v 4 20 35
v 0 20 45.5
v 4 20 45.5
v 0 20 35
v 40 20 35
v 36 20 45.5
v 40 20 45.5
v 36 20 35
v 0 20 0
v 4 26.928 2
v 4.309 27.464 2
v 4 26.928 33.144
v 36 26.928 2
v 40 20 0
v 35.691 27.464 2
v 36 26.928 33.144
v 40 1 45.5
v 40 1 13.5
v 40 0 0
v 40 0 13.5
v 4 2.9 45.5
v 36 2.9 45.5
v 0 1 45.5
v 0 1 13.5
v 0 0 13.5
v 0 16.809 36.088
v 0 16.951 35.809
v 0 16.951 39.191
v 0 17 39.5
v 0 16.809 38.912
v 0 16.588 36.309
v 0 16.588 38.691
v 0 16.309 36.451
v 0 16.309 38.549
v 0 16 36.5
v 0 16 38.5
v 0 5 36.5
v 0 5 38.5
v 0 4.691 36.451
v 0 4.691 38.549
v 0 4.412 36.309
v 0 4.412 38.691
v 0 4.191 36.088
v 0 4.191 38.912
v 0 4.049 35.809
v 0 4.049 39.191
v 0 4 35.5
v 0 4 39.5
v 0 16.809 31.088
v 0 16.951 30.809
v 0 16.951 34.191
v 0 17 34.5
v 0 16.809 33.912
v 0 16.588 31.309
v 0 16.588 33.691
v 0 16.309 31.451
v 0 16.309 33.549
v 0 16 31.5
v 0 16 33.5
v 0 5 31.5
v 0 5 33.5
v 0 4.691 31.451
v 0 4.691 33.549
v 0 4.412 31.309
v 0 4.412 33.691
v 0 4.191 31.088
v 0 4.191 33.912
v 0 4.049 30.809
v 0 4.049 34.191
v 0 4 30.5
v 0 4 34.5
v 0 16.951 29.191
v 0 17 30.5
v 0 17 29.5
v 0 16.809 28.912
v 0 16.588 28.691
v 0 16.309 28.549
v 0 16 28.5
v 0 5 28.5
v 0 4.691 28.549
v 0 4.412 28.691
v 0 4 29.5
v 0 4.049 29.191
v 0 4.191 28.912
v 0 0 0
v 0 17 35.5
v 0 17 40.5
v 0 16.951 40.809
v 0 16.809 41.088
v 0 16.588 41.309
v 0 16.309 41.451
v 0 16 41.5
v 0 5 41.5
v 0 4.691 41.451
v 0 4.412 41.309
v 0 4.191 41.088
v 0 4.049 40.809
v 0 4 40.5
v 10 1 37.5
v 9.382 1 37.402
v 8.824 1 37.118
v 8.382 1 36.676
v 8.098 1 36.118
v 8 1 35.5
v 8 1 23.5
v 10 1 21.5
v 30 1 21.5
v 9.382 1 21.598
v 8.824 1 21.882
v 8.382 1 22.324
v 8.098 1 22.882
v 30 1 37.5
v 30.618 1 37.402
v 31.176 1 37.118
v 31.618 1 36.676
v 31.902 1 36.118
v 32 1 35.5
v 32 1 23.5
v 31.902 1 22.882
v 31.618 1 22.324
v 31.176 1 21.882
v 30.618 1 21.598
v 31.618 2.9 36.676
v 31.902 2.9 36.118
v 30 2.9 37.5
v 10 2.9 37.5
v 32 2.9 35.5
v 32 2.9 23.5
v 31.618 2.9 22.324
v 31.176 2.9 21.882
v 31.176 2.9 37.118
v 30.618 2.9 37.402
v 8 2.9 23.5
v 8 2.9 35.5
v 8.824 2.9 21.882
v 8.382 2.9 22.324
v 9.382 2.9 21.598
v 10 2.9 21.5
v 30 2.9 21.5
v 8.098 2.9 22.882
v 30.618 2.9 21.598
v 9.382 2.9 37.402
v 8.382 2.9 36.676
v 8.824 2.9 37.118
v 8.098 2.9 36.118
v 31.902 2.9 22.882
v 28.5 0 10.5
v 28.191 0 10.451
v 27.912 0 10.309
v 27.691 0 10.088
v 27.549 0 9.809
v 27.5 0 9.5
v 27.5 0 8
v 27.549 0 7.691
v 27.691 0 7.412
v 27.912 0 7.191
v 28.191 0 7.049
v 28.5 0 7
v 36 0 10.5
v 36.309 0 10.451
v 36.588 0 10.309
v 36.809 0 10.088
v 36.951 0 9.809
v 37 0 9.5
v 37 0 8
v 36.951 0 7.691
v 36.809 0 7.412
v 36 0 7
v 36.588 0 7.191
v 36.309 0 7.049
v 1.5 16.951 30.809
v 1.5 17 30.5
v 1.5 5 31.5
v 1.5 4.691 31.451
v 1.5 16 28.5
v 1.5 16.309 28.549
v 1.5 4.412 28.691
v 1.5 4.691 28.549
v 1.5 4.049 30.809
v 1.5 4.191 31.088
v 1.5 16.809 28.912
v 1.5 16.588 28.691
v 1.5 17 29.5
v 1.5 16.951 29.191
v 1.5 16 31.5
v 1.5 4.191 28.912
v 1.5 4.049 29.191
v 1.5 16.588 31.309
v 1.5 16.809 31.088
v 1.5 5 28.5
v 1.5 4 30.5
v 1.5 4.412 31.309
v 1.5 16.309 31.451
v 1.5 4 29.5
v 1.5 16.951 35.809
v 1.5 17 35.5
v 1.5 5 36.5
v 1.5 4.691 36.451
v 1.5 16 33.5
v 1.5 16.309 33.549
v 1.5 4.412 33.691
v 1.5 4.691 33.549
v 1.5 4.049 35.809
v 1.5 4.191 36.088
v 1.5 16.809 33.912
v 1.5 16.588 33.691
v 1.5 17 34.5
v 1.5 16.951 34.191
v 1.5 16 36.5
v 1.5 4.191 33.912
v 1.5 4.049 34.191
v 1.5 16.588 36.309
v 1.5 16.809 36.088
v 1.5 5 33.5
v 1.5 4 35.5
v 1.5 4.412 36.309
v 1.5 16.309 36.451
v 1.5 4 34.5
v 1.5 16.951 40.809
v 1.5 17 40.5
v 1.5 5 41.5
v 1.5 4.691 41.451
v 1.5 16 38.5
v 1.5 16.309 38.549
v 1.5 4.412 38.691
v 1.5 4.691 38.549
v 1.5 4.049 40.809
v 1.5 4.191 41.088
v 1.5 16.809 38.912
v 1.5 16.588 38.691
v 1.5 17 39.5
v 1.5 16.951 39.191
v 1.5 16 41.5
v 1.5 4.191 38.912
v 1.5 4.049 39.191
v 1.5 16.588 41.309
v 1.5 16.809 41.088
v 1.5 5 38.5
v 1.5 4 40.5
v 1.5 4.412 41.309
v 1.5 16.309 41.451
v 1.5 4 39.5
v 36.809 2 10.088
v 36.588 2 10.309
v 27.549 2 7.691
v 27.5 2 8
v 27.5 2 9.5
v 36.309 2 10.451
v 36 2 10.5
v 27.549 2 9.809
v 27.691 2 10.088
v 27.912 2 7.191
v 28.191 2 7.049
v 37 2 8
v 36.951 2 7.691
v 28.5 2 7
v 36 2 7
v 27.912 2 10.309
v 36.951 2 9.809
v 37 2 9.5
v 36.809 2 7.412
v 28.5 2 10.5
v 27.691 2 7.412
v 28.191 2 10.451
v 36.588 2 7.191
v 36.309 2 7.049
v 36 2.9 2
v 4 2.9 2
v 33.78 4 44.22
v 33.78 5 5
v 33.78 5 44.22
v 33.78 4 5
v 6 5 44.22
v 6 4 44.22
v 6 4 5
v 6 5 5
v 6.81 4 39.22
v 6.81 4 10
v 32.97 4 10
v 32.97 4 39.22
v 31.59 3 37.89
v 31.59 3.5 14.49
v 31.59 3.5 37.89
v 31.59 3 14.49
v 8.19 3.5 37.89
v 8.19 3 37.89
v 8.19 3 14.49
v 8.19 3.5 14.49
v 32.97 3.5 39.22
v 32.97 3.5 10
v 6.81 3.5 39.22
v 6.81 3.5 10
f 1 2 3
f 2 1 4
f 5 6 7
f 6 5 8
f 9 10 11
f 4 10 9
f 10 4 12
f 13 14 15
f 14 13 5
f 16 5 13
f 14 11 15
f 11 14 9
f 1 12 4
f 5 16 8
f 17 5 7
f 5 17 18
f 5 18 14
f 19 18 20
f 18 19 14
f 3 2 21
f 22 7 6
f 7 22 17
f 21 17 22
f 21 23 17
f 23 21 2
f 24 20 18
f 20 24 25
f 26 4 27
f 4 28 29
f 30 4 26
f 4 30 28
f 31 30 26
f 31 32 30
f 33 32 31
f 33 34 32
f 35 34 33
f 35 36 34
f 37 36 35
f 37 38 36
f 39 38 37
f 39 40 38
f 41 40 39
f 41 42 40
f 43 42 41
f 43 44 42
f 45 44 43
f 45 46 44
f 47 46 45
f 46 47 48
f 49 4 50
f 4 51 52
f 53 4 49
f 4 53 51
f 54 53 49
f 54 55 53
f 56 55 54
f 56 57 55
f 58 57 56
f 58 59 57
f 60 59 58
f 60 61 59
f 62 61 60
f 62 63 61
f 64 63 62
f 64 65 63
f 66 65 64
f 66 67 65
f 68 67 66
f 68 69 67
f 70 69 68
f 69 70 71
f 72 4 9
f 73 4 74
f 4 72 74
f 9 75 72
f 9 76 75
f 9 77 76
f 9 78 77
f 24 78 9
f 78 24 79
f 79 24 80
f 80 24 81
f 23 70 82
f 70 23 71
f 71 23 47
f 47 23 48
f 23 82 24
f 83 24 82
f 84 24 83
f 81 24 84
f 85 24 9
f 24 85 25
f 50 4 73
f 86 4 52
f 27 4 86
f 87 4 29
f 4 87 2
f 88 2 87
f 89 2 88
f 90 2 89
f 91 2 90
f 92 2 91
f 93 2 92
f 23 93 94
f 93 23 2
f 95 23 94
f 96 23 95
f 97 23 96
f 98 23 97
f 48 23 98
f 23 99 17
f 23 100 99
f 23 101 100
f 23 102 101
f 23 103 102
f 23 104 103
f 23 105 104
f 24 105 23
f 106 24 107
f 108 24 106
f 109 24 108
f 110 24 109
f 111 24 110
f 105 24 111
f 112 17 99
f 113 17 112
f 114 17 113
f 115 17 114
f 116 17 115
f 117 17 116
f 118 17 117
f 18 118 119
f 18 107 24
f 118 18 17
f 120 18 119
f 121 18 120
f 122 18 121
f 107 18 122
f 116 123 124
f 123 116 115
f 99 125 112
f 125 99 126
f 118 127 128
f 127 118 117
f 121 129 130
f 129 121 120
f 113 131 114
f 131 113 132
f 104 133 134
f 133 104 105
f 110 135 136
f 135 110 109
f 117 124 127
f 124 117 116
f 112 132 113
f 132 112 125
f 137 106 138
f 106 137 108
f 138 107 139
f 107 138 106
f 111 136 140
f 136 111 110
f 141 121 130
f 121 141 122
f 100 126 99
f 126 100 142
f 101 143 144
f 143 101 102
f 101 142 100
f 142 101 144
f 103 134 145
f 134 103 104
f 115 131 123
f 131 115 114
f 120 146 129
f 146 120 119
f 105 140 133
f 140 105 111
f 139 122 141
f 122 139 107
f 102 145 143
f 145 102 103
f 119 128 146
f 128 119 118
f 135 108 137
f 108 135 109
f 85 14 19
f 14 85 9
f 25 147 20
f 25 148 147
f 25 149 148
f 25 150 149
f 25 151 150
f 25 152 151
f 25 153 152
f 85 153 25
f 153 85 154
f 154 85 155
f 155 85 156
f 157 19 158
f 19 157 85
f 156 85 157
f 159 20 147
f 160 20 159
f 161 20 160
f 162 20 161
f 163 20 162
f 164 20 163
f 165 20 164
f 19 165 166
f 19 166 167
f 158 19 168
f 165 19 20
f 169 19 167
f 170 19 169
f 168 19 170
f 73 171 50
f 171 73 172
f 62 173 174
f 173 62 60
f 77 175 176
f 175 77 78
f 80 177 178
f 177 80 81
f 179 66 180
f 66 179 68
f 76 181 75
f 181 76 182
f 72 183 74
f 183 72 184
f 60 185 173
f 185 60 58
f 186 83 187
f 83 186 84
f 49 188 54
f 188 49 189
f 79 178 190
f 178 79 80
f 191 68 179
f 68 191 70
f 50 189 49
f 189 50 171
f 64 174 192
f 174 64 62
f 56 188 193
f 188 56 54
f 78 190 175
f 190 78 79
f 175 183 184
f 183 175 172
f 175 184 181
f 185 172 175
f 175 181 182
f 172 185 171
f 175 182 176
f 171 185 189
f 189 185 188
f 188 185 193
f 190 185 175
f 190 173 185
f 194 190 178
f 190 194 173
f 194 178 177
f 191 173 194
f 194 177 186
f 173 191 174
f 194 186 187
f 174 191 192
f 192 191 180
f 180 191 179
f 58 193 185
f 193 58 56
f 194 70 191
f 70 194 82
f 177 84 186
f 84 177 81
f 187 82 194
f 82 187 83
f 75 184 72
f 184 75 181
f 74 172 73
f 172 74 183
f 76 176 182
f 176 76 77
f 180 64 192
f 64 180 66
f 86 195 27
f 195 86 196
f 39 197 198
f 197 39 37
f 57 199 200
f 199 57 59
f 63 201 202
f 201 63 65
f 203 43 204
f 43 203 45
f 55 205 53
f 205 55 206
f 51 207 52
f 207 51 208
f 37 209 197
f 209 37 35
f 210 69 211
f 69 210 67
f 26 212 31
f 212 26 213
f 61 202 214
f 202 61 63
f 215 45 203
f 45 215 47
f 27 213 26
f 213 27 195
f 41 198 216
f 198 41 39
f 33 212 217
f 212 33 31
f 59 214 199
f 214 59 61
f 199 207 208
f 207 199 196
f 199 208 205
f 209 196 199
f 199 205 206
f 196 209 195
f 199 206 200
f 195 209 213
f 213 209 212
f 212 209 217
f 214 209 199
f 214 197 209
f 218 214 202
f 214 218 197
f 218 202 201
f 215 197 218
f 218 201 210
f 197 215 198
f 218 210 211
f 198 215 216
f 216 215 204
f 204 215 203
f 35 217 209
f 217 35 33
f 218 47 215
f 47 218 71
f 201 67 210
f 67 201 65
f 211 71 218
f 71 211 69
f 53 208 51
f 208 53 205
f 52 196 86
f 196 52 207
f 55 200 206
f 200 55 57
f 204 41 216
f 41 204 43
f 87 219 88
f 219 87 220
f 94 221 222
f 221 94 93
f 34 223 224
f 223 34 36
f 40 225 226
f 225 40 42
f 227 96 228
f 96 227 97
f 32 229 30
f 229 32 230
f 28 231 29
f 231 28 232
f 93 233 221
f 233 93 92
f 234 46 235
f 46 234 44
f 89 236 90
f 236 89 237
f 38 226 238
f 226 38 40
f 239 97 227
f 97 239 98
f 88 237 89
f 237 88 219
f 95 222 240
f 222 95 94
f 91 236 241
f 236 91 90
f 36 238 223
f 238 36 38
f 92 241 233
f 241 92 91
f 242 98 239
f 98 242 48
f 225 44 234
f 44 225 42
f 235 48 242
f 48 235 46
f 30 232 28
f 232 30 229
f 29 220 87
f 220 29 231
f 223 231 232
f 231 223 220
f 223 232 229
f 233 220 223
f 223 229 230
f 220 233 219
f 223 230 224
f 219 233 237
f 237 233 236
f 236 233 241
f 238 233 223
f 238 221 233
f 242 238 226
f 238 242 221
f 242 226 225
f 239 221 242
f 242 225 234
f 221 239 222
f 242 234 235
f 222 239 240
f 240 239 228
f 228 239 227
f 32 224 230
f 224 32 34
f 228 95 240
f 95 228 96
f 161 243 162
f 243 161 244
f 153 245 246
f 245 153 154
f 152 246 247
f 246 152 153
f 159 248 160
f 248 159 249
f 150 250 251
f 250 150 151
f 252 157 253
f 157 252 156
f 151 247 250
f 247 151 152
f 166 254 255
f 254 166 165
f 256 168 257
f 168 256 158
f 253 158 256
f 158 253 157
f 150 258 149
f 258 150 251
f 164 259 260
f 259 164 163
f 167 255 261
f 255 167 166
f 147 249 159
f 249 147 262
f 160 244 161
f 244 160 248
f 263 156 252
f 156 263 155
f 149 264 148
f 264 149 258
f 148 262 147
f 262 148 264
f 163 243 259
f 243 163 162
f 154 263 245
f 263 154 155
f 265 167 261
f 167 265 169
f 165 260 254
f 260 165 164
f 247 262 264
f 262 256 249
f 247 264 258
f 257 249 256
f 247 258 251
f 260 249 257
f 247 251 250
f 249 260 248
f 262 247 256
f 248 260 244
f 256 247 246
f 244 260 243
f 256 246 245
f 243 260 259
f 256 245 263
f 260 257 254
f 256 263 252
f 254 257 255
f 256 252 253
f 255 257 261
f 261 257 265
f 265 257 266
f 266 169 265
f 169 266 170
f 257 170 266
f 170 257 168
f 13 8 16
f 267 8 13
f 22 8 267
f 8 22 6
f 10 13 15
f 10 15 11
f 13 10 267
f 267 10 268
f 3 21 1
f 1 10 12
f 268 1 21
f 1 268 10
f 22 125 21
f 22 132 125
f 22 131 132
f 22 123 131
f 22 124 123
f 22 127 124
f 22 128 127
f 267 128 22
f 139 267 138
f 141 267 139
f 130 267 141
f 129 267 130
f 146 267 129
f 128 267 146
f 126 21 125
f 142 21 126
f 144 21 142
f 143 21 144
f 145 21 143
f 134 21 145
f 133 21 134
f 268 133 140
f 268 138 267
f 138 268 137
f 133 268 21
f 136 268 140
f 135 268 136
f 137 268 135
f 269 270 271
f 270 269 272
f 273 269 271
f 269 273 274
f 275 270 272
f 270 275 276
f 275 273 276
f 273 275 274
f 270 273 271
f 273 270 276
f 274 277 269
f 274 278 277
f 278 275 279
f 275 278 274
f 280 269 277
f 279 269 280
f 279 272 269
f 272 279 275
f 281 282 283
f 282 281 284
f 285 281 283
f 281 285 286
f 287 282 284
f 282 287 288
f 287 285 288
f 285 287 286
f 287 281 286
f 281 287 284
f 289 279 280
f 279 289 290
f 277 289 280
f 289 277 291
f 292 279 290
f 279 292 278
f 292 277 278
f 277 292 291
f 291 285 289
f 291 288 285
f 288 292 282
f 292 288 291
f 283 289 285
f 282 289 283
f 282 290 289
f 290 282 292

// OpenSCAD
screen_inset = 1;
screen_height = 35;
body_depth = 20;
body_width = 40;
lower_body_height = 13.5;

crt_cover_depth = 12;
crt_cover_side_angle = 30;

vent_p = 4;

bezel = 10;

emotions = [
	"none"
	//"uwu",
	//"joy",
	//"happy",
	//"meh",
	//"sad",
	//"angry",
];

for (i = [0 : len(emotions)-1]) translate([(body_width+20)*i, 0, 0]) {
	if (emotions[i] != "none") intersection() {
		color([.5, .5, .5])
			translate([-21, 10, -7])
			rotate([90])
			linear_extrude(height=20)
			import(str("vector/", emotions[i], "_face.svg"));

		translate([body_width/2, 10+screen_inset, lower_body_height+screen_height/2]) cube([screen_height,20,20], center = true);
	}


	difference() {
		//body
		union() {
			// back thingy
			translate([0, body_depth, 0]) difference() {
				cube([body_width, crt_cover_depth, screen_height]);
				// left
				translate([0, 0, -10]) rotate([0, 0, 90-crt_cover_side_angle]) cube([100, 100, 100]);
				// right
				translate([body_width, 0, -10]) rotate([0, 0, crt_cover_side_angle]) cube([100, 100, 100]);

				// bottom
				translate([0, 0, 0]) rotate([-90+15, 0, 0]) cube([100, 100, 100]);
				// top
				translate([0, 0, screen_height]) rotate([-90+75, 0, 0]) cube([100, 100, 100]);
				}

				// lower body
				cube([body_width, body_depth, lower_body_height]);

				// screen
				translate([0, screen_inset, lower_body_height]) difference() {
				screen_dim = [body_width, body_depth-screen_inset, 32];
				cube(screen_dim);
				minkowski() {
					translate([bezel, 0, bezel]) cube([screen_dim.x - bezel*2, 2, screen_dim.z - bezel*2]);
					rotate([90, 0, 0]) cylinder(r=2, h=1, $fn=20);
				}
			}
		}

		// vents
		for (venty = [30, screen_height, 40])
			translate([-1, (body_depth)/2 + screen_inset/2, venty]) minkowski() {
				cube([3, (body_depth - screen_inset) - vent_p*2, 1], center=true);
				rotate([0, 90, 0]) cylinder(r=1, h=1, $fn=20);
			}

		// disk slot
		translate([body_width-11.5, -10, 8]) minkowski() {
			cube([7.5, 12, 1.5]);
			rotate([90, 0, 0]) cylinder(r=1, h=1, $fn=20);
		}

		translate([4, screen_inset+2-.1, 2])
			cube([body_width-(4*2), 100, 100]);
	}
}

translate([6, 4, 5]) {
	board_width = 27.78;
	board_height = 39.22;
	screen_height = 23.40;
	screen_lr_pad = 2.19;
	screen_top_pad = 6.33;

	board_depth = 1;
	screen_depth = 1;

	color([.4,.4,.9])
		cube([board_width, board_depth, board_height]);

	color([.3,.3,.3])
		translate([screen_lr_pad, -screen_depth, board_height-screen_height-screen_top_pad])
		cube([board_width - (screen_lr_pad*2), screen_depth,screen_height]);

	color([.5,.3,.3])
		translate([.81, -screen_depth/2, board_height-29.22-screen_top_pad+1.33])
		cube([board_width - (.81*2), screen_depth, 29.22]);
}
